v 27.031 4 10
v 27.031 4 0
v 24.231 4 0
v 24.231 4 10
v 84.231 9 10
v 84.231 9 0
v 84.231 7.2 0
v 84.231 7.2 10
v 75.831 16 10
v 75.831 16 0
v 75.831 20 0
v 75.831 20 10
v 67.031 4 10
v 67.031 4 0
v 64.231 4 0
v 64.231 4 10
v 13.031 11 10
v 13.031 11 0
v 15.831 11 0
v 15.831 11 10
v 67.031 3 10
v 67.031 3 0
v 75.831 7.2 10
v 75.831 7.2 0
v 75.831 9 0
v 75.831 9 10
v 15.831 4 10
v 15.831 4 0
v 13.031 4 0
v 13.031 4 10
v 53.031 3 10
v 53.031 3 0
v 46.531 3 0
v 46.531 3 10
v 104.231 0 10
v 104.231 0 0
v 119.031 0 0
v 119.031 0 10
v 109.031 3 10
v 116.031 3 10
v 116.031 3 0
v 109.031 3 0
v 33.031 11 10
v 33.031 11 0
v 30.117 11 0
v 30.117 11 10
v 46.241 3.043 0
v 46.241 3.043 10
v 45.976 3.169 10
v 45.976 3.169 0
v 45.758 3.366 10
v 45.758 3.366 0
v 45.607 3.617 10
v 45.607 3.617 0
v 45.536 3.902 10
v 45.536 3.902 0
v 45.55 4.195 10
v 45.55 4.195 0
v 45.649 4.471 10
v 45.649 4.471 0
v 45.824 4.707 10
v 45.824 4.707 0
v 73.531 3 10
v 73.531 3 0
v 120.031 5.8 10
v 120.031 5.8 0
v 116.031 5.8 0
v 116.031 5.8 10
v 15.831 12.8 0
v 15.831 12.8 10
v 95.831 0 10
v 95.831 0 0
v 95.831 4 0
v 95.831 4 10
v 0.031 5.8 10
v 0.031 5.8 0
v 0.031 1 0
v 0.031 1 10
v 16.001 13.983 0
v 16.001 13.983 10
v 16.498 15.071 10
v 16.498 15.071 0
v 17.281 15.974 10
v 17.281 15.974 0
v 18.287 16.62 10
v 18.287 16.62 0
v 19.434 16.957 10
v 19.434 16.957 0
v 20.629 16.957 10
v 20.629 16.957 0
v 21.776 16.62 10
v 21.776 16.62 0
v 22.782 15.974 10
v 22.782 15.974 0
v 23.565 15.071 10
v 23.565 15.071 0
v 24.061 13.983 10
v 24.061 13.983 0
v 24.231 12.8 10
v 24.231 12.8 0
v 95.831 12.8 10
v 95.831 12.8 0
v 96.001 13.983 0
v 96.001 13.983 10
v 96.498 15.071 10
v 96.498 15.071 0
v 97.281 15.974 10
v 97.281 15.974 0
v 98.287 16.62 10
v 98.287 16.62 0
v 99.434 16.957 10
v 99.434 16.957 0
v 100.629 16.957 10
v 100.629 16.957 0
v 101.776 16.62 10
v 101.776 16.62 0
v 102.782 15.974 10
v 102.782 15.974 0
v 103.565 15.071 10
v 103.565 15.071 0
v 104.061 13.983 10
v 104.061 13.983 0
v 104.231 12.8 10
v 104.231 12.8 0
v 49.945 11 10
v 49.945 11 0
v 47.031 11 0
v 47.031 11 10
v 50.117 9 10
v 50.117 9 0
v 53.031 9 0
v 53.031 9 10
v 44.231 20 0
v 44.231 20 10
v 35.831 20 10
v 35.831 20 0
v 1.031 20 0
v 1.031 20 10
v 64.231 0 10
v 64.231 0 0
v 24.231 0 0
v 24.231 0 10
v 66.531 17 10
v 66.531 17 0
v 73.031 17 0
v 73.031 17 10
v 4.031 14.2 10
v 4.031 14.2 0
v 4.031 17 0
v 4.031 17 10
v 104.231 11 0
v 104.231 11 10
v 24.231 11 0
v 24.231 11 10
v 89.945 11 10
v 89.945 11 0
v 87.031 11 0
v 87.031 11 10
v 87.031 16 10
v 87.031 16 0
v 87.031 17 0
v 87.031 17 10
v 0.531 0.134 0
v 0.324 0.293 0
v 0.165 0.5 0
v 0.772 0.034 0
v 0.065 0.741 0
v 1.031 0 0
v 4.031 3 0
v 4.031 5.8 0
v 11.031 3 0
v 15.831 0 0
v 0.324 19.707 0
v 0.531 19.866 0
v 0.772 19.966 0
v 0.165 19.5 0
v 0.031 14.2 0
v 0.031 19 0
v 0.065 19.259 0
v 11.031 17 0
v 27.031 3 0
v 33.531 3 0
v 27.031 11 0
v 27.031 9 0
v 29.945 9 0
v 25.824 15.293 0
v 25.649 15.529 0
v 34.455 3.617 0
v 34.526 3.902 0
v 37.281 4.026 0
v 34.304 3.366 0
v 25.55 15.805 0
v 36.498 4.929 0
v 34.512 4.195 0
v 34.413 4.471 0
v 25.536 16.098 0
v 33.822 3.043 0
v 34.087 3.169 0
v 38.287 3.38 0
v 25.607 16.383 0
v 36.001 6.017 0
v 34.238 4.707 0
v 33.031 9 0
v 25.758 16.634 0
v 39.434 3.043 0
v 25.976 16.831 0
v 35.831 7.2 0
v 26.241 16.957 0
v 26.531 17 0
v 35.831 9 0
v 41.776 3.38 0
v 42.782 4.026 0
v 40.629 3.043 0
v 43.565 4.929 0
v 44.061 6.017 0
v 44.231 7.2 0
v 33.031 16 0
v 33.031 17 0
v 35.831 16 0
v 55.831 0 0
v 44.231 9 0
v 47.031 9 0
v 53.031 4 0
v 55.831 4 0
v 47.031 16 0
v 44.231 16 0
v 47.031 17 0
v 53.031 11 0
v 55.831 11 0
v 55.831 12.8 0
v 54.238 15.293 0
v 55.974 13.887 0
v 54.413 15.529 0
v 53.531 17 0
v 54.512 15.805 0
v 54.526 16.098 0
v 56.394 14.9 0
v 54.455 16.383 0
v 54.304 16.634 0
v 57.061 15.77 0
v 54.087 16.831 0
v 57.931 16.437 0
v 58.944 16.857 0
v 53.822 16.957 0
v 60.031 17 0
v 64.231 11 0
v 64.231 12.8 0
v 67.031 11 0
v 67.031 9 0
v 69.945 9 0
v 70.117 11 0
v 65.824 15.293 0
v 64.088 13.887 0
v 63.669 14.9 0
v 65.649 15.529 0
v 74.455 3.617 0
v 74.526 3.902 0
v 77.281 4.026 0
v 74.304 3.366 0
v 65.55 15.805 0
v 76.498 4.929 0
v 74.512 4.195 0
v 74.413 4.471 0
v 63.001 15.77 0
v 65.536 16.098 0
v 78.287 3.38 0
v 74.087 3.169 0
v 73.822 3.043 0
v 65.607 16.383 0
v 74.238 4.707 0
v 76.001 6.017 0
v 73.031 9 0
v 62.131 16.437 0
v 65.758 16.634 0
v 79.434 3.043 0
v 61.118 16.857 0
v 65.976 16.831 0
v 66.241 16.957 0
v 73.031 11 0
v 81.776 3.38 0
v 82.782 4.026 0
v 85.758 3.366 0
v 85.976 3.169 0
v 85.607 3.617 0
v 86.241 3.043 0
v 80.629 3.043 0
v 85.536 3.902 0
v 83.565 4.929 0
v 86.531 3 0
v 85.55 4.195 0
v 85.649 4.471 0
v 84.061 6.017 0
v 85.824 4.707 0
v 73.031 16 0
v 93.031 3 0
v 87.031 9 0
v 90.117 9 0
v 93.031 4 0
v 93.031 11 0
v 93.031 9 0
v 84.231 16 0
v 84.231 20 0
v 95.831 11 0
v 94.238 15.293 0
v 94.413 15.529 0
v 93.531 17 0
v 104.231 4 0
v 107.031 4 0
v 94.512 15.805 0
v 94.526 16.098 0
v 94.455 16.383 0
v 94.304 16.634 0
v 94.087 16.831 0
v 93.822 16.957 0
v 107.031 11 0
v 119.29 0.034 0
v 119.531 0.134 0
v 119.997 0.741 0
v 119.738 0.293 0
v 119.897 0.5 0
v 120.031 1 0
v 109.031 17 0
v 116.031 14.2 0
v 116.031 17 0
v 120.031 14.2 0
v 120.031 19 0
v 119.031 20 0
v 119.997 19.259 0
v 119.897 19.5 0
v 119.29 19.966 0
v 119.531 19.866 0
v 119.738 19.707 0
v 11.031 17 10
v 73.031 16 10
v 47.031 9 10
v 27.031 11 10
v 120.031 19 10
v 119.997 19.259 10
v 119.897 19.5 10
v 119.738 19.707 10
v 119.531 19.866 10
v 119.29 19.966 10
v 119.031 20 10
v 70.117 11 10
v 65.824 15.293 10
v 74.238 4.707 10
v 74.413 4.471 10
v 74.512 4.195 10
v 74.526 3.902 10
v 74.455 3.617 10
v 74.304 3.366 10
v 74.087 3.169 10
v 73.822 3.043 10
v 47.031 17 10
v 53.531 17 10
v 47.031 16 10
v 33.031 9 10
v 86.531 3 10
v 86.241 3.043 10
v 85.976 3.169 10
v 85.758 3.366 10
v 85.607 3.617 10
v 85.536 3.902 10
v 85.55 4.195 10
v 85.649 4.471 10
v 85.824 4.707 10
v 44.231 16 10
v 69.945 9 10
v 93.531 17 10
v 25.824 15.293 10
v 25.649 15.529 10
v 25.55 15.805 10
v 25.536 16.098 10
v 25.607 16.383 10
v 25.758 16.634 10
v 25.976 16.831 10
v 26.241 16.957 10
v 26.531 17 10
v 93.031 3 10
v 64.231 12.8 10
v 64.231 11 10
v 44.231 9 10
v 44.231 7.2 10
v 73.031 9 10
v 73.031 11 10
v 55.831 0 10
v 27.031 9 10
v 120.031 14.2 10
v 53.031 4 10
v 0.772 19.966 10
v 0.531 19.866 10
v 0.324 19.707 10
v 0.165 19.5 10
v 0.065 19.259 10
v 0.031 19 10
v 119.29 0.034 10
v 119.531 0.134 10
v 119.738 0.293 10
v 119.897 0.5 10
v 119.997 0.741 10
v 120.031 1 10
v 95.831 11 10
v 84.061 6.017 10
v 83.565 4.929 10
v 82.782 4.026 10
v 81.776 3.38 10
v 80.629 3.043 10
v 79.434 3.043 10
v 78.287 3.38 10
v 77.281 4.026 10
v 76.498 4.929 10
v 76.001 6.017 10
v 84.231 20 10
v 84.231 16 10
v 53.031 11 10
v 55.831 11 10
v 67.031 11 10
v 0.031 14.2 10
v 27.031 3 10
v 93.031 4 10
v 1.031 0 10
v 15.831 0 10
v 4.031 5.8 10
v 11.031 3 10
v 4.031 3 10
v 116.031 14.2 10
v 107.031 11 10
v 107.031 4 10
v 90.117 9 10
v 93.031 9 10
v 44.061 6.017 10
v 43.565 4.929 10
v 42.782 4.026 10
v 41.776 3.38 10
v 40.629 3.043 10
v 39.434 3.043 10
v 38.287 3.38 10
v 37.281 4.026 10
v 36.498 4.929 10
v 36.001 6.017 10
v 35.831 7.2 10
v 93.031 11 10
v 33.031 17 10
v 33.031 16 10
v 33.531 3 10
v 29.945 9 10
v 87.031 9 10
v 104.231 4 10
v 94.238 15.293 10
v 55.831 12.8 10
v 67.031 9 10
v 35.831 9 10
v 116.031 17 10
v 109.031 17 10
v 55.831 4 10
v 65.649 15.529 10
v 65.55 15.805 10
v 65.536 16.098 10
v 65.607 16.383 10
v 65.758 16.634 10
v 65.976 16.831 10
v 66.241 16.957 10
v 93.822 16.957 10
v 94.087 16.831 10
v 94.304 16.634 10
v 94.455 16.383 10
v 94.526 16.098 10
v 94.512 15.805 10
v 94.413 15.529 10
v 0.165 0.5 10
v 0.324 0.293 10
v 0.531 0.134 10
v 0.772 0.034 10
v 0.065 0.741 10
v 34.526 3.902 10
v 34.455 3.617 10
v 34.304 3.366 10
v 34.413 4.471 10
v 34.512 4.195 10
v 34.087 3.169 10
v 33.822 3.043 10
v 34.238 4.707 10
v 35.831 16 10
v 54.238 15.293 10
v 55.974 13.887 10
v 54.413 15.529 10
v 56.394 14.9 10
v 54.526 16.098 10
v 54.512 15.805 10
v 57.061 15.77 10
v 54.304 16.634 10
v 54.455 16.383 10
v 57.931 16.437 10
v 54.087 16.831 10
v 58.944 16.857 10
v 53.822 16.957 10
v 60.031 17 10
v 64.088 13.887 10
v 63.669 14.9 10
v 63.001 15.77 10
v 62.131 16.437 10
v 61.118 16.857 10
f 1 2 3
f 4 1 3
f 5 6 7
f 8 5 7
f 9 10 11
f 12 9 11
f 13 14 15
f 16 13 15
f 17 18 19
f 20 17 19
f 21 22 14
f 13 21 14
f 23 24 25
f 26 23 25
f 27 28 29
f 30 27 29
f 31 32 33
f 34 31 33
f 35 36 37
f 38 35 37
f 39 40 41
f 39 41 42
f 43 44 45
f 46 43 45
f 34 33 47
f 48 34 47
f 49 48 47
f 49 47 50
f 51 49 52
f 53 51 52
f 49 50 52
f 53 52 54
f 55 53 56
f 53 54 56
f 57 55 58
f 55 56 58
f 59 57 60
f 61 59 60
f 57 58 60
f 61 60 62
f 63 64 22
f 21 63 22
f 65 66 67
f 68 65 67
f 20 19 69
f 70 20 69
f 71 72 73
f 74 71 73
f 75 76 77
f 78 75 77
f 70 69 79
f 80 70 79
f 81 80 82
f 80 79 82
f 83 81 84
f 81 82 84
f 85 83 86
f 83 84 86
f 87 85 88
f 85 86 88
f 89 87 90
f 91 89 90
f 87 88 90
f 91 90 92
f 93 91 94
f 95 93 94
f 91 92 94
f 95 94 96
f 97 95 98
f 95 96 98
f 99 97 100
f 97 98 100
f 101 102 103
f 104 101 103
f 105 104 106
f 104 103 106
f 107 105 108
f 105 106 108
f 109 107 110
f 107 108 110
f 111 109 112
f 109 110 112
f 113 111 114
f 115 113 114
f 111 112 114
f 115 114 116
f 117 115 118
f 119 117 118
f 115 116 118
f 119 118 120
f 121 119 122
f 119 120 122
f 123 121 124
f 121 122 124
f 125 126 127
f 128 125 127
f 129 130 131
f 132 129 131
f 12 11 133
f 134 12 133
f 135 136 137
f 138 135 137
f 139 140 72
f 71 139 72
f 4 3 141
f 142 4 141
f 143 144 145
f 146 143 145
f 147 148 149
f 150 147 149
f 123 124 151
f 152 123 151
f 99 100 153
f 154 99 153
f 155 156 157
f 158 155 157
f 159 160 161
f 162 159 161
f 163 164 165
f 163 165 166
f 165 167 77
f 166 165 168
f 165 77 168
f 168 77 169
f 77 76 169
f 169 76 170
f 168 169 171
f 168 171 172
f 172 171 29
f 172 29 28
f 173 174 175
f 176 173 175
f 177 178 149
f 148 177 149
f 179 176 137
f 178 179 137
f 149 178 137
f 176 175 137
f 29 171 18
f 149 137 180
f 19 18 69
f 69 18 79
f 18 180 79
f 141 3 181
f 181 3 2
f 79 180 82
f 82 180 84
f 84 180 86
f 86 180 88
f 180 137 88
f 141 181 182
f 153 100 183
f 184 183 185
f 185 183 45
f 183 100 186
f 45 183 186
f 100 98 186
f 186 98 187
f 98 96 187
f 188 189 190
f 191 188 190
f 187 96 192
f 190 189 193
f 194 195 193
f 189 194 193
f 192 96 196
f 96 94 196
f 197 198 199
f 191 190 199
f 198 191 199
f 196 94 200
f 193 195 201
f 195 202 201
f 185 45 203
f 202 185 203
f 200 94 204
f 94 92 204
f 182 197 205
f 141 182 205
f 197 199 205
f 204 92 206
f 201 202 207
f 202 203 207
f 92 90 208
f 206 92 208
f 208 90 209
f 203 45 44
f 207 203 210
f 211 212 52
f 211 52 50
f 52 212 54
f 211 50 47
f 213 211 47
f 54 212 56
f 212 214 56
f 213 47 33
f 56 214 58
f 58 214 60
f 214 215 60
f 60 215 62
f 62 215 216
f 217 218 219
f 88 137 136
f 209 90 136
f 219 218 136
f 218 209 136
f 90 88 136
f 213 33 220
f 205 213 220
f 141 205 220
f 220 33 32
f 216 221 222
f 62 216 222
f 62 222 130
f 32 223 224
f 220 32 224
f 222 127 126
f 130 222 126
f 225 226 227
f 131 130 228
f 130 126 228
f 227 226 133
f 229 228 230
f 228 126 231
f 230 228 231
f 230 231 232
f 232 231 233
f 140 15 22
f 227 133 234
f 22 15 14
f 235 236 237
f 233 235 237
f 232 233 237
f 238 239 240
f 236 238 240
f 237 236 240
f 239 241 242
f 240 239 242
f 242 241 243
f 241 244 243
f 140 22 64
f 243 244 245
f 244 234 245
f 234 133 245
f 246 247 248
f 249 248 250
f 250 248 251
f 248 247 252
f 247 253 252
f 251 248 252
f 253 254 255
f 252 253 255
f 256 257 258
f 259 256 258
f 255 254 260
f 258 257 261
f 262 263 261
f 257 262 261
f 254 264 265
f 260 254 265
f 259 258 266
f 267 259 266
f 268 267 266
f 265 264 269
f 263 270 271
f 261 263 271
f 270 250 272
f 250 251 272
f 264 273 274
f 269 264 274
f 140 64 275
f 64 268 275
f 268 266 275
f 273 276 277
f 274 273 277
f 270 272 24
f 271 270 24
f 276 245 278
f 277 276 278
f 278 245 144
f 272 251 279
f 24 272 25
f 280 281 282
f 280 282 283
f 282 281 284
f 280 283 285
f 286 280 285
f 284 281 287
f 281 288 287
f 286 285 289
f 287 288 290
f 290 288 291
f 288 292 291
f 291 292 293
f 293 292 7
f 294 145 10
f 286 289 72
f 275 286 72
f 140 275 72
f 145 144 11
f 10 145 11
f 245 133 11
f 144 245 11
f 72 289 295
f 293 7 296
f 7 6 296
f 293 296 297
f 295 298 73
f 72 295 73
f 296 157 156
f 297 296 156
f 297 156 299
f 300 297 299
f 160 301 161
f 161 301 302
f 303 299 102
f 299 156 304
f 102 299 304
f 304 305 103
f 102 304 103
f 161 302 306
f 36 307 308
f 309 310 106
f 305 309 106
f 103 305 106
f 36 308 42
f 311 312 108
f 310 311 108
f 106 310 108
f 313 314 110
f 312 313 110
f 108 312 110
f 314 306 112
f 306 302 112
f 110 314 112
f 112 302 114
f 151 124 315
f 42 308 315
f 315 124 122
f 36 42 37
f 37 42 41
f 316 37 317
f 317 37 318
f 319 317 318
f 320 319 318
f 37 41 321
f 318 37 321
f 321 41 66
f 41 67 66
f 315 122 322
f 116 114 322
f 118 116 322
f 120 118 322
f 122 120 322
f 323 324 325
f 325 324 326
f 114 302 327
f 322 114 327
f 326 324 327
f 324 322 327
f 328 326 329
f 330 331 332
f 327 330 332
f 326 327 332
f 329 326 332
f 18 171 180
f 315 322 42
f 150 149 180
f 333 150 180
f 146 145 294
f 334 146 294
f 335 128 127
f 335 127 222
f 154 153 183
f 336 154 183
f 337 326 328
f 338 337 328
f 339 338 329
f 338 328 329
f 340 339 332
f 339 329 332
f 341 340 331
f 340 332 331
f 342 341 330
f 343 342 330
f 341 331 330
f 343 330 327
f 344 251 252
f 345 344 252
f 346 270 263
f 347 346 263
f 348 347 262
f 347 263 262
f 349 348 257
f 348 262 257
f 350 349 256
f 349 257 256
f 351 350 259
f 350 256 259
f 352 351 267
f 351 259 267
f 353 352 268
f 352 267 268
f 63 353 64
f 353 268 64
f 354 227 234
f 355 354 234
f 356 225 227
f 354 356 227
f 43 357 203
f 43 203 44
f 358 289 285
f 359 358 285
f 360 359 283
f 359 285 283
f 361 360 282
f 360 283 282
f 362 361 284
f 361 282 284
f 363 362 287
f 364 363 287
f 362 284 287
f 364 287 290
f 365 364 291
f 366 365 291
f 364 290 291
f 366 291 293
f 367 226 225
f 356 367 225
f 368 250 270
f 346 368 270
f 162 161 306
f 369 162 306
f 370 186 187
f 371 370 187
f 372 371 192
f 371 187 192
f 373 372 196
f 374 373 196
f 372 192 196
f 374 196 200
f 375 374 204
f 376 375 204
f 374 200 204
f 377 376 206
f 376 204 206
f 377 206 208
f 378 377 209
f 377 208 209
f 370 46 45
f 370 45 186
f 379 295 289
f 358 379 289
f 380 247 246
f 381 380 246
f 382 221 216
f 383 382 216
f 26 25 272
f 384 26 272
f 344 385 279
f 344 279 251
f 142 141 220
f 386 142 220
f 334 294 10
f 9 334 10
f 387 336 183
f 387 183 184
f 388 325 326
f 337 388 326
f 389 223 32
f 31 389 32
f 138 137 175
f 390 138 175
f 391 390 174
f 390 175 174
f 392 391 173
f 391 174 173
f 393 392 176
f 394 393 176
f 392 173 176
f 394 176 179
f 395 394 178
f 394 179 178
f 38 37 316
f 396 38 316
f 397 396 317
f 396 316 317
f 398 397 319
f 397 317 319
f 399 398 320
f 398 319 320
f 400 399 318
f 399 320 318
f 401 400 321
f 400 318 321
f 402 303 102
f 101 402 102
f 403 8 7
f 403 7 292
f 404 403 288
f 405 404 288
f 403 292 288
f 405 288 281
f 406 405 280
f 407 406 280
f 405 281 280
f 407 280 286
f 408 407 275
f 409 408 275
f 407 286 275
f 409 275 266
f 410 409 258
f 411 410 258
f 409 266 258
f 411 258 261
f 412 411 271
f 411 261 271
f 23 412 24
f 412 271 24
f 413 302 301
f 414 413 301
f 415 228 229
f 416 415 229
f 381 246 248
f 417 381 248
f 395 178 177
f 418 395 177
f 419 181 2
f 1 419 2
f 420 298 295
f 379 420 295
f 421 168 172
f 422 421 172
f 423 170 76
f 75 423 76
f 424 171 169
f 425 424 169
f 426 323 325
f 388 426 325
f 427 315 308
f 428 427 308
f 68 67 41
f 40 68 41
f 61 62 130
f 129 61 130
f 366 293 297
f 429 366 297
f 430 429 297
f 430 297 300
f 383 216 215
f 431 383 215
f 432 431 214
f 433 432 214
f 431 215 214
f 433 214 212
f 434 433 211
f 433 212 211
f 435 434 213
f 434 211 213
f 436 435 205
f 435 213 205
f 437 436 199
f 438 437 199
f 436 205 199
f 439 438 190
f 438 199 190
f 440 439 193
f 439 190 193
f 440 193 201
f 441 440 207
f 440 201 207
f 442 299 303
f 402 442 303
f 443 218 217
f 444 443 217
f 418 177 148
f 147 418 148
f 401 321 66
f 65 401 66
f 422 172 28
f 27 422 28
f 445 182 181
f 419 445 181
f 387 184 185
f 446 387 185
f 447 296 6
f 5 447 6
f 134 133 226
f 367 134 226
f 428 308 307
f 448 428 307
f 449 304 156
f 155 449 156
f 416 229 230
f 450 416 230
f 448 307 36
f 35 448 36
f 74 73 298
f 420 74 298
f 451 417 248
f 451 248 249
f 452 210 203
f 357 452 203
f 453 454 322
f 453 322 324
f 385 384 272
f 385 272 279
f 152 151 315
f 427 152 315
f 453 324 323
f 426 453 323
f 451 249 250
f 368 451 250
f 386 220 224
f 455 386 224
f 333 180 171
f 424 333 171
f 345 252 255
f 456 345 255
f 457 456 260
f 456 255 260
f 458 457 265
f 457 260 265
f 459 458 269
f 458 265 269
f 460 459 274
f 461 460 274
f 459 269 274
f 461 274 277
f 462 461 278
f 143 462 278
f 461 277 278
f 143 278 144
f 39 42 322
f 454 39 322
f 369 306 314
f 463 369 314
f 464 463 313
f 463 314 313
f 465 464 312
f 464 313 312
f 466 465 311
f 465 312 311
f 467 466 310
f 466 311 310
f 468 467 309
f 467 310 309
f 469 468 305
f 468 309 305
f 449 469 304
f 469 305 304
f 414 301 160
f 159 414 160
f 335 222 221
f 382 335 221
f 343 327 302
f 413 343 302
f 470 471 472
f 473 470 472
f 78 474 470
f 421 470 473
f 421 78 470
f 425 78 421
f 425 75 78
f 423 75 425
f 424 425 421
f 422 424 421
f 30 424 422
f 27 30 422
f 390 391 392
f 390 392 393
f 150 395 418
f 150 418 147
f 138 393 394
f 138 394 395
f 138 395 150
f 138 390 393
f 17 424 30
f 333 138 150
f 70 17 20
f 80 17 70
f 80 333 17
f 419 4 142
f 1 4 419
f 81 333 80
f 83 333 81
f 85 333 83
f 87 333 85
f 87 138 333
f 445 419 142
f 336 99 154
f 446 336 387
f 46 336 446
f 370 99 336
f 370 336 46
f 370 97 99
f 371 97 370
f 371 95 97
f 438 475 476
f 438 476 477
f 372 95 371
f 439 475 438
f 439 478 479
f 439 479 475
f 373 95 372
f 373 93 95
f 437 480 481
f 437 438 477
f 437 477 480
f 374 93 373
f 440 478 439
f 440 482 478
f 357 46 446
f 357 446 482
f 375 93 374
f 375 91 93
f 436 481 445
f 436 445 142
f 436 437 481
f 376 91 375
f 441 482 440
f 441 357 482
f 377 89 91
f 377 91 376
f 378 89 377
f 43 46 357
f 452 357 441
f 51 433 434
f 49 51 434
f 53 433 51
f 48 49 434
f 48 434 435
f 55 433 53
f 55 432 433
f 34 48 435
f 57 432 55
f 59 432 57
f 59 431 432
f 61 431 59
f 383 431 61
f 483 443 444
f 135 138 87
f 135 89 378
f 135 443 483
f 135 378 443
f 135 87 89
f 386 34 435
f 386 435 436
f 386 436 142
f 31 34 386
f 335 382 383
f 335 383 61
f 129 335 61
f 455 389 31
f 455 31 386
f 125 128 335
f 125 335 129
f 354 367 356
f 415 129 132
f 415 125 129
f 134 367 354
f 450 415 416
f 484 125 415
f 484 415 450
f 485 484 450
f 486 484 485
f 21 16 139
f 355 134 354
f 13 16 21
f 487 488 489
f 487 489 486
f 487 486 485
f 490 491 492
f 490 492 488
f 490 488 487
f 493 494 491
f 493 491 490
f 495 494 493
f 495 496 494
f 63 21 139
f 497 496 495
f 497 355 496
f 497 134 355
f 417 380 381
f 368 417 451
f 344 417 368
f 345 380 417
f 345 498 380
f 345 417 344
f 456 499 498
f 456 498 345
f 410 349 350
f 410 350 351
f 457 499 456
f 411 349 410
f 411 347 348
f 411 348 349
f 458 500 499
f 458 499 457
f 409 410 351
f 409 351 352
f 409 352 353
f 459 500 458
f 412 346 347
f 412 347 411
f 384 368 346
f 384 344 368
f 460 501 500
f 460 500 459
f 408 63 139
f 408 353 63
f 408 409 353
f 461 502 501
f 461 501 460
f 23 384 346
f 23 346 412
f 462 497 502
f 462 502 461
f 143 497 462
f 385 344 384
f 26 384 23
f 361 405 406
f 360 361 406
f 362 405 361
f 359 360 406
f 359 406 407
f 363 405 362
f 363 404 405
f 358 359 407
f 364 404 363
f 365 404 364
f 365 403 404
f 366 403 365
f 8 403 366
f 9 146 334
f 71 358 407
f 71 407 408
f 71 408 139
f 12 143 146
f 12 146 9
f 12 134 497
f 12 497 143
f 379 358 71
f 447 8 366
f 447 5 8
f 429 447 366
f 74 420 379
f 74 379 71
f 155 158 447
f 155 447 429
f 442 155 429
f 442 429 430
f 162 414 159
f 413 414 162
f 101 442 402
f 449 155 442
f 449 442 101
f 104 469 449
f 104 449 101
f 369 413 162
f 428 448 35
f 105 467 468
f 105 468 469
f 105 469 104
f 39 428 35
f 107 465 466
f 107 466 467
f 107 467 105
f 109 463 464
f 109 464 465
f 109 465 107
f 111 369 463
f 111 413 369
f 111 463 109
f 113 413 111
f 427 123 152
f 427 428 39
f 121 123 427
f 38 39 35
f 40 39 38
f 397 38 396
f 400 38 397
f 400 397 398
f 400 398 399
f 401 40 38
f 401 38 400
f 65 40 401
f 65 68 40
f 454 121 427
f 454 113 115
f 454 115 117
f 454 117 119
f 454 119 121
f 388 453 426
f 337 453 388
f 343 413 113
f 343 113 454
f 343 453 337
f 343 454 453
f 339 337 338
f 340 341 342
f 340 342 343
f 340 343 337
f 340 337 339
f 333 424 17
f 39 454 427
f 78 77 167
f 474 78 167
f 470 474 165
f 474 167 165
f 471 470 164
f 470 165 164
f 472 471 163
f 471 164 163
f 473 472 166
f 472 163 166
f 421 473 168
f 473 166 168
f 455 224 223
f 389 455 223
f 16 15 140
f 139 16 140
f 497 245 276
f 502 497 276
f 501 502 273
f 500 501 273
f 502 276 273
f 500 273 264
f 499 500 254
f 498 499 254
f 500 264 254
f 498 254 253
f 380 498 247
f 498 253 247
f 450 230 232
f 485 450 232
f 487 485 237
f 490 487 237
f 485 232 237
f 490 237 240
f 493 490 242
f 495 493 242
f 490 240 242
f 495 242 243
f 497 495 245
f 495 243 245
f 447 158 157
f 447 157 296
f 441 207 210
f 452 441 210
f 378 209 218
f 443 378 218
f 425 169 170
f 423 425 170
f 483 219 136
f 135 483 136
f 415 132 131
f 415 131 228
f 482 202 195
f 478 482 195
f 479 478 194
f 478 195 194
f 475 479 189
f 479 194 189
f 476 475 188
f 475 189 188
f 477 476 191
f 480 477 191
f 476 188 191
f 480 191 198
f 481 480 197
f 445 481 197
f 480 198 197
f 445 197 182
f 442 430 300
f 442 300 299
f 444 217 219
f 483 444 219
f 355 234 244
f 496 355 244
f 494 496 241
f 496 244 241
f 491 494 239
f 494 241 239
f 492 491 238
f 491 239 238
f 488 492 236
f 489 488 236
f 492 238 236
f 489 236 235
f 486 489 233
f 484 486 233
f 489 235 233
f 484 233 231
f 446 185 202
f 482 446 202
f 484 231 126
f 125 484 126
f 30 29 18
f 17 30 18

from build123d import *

# Parameters (mm, degrees)
EXTRUDE_1_DEPTH = 10


with BuildPart() as part:
    # 草图1 → 凸台-拉伸1 (new body)
    with BuildSketch(Plane.XY):
        with BuildLine():
            Line((66.531250095, 17), (73.031250095, 17))
            Line((73.031250095, 17), (73.031250095, 16))
            Line((73.031250095, 16), (75.831250095, 16))
            Line((75.831250095, 16), (75.831250095, 20))
            Line((75.831250095, 20), (60.031250095, 20))
            Line((60.031250095, 20), (44.231250095, 20))
            Line((44.231250095, 20), (44.231250095, 16))
            Line((44.231250095, 16), (47.031250095, 16))
            Line((47.031250095, 16), (47.031250095, 17))
            Line((47.031250095, 17), (53.531250095, 17))
            ThreePointArc((53.531250095, 17), (54.455129627, 16.382683432), (54.238356876, 15.292893219))
            Line((54.238356876, 15.292893219), (49.945463657, 11))
            Line((49.945463657, 11), (47.031250095, 11))
            Line((47.031250095, 11), (47.031250095, 9))
            Line((47.031250095, 9), (44.231250095, 9))
            Line((44.231250095, 9), (44.231250095, 7.2))
            ThreePointArc((44.231250095, 7.2), (40.031250095, 3), (35.831250095, 7.2))
            Line((35.831250095, 7.2), (35.831250095, 9))
            Line((35.831250095, 9), (33.031250095, 9))
            Line((33.031250095, 9), (33.031250095, 11))
            Line((33.031250095, 11), (30.117036532, 11))
            Line((30.117036532, 11), (25.824143314, 15.292893219))
            ThreePointArc((25.824143314, 15.292893219), (25.607370562, 16.382683432), (26.531250095, 17))
            Line((26.531250095, 17), (33.031250095, 17))
            Line((33.031250095, 17), (33.031250095, 16))
            Line((33.031250095, 16), (35.831250095, 16))
            Line((35.831250095, 16), (35.831250095, 20))
            Line((35.831250095, 20), (1.031250095, 20))
            ThreePointArc((1.031250095, 20), (0.324143314, 19.707106781), (0.031250095, 19))
            Line((0.031250095, 19), (0.031250095, 14.2))
            Line((0.031250095, 14.2), (4.031250095, 14.2))
            Line((4.031250095, 14.2), (4.031250095, 17))
            Line((4.031250095, 17), (11.031250095, 17))
            Line((11.031250095, 17), (11.031250095, 3))
            Line((11.031250095, 3), (4.031250095, 3))
            Line((4.031250095, 3), (4.031250095, 5.8))
            Line((4.031250095, 5.8), (0.031250095, 5.8))
            Line((0.031250095, 5.8), (0.031250095, 1))
            ThreePointArc((0.031250095, 1), (0.324143314, 0.292893219), (1.031250095, 0))
            Line((1.031250095, 0), (15.831250095, 0))
            Line((15.831250095, 0), (15.831250095, 4))
            Line((15.831250095, 4), (13.031250095, 4))
            Line((13.031250095, 4), (13.031250095, 11))
            Line((13.031250095, 11), (15.831250095, 11))
            Line((15.831250095, 11), (15.831250095, 12.8))
            ThreePointArc((15.831250095, 12.8), (20.031250095, 17), (24.231250095, 12.8))
            Line((24.231250095, 12.8), (24.231250095, 11))
            Line((24.231250095, 11), (27.031250095, 11))
            Line((27.031250095, 11), (27.031250095, 9))
            Line((27.031250095, 9), (29.945463657, 9))
            Line((29.945463657, 9), (34.238356876, 4.707106781))
            ThreePointArc((34.238356876, 4.707106781), (34.455129627, 3.617316568), (33.531250095, 3))
            Line((33.531250095, 3), (27.031250095, 3))
            Line((27.031250095, 3), (27.031250095, 4))
            Line((27.031250095, 4), (24.231250095, 4))
            Line((24.231250095, 4), (24.231250095, 0))
            Line((24.231250095, 0), (55.831250095, 0))
            Line((55.831250095, 0), (55.831250095, 4))
            Line((55.831250095, 4), (53.031250095, 4))
            Line((53.031250095, 4), (53.031250095, 3))
            Line((53.031250095, 3), (46.531250095, 3))
            ThreePointArc((46.531250095, 3), (45.607370562, 3.617316568), (45.824143314, 4.707106781))
            Line((45.824143314, 4.707106781), (50.117036532, 9))
            Line((50.117036532, 9), (53.031250095, 9))
            Line((53.031250095, 9), (53.031250095, 11))
            Line((53.031250095, 11), (55.831250095, 11))
            Line((55.831250095, 11), (55.831250095, 12.8))
            ThreePointArc((55.831250095, 12.8), (57.061401614, 15.769848481), (60.031250095, 17))
            ThreePointArc((60.031250095, 17), (63.001098576, 15.769848481), (64.231250095, 12.8))
            Line((64.231250095, 12.8), (64.231250095, 11))
            Line((64.231250095, 11), (67.031250095, 11))
            Line((67.031250095, 11), (67.031250095, 9))
            Line((67.031250095, 9), (69.945463657, 9))
            Line((69.945463657, 9), (74.238356876, 4.707106781))
            ThreePointArc((74.238356876, 4.707106781), (74.455129627, 3.617316568), (73.531250095, 3))
            Line((73.531250095, 3), (67.031250095, 3))
            Line((67.031250095, 3), (67.031250095, 4))
            Line((67.031250095, 4), (64.231250095, 4))
            Line((64.231250095, 4), (64.231250095, 0))
            Line((64.231250095, 0), (95.831250095, 0))
            Line((95.831250095, 0), (95.831250095, 4))
            Line((95.831250095, 4), (93.031250095, 4))
            Line((93.031250095, 4), (93.031250095, 3))
            Line((93.031250095, 3), (86.531250095, 3))
            ThreePointArc((86.531250095, 3), (85.607370562, 3.617316568), (85.824143314, 4.707106781))
            Line((85.824143314, 4.707106781), (90.117036532, 9))
            Line((90.117036532, 9), (93.031250095, 9))
            Line((93.031250095, 9), (93.031250095, 11))
            Line((93.031250095, 11), (95.831250095, 11))
            Line((95.831250095, 11), (95.831250095, 12.8))
            ThreePointArc((95.831250095, 12.8), (100.031250095, 17), (104.231250095, 12.8))
            Line((104.231250095, 12.8), (104.231250095, 11))
            Line((104.231250095, 11), (107.031250095, 11))
            Line((107.031250095, 11), (107.031250095, 4))
            Line((107.031250095, 4), (104.231250095, 4))
            Line((104.231250095, 4), (104.231250095, 0))
            Line((104.231250095, 0), (119.031250095, 0))
            ThreePointArc((119.031250095, 0), (119.738356876, 0.292893219), (120.031250095, 1))
            Line((120.031250095, 1), (120.031250095, 5.8))
            Line((120.031250095, 5.8), (116.031250095, 5.8))
            Line((116.031250095, 5.8), (116.031250095, 3))
            Line((116.031250095, 3), (109.031250095, 3))
            Line((109.031250095, 3), (109.031250095, 17))
            Line((109.031250095, 17), (116.031250095, 17))
            Line((116.031250095, 17), (116.031250095, 14.2))
            Line((116.031250095, 14.2), (120.031250095, 14.2))
            Line((120.031250095, 14.2), (120.031250095, 19))
            ThreePointArc((120.031250095, 19), (119.738356876, 19.707106781), (119.031250095, 20))
            Line((119.031250095, 20), (84.231250095, 20))
            Line((84.231250095, 20), (84.231250095, 16))
            Line((84.231250095, 16), (87.031250095, 16))
            Line((87.031250095, 16), (87.031250095, 17))
            Line((87.031250095, 17), (93.531250095, 17))
            ThreePointArc((93.531250095, 17), (94.455129627, 16.382683432), (94.238356876, 15.292893219))
            Line((94.238356876, 15.292893219), (89.945463657, 11))
            Line((89.945463657, 11), (87.031250095, 11))
            Line((87.031250095, 11), (87.031250095, 9))
            Line((87.031250095, 9), (84.231250095, 9))
            Line((84.231250095, 9), (84.231250095, 7.2))
            ThreePointArc((84.231250095, 7.2), (80.031250095, 3), (75.831250095, 7.2))
            Line((75.831250095, 7.2), (75.831250095, 9))
            Line((75.831250095, 9), (73.031250095, 9))
            Line((73.031250095, 9), (73.031250095, 11))
            Line((73.031250095, 11), (70.117036532, 11))
            Line((70.117036532, 11), (65.824143314, 15.292893219))
            ThreePointArc((65.824143314, 15.292893219), (65.607370562, 16.382683432), (66.531250095, 17))
        make_face()
    extrude(amount=EXTRUDE_1_DEPTH)


solid = part.part
